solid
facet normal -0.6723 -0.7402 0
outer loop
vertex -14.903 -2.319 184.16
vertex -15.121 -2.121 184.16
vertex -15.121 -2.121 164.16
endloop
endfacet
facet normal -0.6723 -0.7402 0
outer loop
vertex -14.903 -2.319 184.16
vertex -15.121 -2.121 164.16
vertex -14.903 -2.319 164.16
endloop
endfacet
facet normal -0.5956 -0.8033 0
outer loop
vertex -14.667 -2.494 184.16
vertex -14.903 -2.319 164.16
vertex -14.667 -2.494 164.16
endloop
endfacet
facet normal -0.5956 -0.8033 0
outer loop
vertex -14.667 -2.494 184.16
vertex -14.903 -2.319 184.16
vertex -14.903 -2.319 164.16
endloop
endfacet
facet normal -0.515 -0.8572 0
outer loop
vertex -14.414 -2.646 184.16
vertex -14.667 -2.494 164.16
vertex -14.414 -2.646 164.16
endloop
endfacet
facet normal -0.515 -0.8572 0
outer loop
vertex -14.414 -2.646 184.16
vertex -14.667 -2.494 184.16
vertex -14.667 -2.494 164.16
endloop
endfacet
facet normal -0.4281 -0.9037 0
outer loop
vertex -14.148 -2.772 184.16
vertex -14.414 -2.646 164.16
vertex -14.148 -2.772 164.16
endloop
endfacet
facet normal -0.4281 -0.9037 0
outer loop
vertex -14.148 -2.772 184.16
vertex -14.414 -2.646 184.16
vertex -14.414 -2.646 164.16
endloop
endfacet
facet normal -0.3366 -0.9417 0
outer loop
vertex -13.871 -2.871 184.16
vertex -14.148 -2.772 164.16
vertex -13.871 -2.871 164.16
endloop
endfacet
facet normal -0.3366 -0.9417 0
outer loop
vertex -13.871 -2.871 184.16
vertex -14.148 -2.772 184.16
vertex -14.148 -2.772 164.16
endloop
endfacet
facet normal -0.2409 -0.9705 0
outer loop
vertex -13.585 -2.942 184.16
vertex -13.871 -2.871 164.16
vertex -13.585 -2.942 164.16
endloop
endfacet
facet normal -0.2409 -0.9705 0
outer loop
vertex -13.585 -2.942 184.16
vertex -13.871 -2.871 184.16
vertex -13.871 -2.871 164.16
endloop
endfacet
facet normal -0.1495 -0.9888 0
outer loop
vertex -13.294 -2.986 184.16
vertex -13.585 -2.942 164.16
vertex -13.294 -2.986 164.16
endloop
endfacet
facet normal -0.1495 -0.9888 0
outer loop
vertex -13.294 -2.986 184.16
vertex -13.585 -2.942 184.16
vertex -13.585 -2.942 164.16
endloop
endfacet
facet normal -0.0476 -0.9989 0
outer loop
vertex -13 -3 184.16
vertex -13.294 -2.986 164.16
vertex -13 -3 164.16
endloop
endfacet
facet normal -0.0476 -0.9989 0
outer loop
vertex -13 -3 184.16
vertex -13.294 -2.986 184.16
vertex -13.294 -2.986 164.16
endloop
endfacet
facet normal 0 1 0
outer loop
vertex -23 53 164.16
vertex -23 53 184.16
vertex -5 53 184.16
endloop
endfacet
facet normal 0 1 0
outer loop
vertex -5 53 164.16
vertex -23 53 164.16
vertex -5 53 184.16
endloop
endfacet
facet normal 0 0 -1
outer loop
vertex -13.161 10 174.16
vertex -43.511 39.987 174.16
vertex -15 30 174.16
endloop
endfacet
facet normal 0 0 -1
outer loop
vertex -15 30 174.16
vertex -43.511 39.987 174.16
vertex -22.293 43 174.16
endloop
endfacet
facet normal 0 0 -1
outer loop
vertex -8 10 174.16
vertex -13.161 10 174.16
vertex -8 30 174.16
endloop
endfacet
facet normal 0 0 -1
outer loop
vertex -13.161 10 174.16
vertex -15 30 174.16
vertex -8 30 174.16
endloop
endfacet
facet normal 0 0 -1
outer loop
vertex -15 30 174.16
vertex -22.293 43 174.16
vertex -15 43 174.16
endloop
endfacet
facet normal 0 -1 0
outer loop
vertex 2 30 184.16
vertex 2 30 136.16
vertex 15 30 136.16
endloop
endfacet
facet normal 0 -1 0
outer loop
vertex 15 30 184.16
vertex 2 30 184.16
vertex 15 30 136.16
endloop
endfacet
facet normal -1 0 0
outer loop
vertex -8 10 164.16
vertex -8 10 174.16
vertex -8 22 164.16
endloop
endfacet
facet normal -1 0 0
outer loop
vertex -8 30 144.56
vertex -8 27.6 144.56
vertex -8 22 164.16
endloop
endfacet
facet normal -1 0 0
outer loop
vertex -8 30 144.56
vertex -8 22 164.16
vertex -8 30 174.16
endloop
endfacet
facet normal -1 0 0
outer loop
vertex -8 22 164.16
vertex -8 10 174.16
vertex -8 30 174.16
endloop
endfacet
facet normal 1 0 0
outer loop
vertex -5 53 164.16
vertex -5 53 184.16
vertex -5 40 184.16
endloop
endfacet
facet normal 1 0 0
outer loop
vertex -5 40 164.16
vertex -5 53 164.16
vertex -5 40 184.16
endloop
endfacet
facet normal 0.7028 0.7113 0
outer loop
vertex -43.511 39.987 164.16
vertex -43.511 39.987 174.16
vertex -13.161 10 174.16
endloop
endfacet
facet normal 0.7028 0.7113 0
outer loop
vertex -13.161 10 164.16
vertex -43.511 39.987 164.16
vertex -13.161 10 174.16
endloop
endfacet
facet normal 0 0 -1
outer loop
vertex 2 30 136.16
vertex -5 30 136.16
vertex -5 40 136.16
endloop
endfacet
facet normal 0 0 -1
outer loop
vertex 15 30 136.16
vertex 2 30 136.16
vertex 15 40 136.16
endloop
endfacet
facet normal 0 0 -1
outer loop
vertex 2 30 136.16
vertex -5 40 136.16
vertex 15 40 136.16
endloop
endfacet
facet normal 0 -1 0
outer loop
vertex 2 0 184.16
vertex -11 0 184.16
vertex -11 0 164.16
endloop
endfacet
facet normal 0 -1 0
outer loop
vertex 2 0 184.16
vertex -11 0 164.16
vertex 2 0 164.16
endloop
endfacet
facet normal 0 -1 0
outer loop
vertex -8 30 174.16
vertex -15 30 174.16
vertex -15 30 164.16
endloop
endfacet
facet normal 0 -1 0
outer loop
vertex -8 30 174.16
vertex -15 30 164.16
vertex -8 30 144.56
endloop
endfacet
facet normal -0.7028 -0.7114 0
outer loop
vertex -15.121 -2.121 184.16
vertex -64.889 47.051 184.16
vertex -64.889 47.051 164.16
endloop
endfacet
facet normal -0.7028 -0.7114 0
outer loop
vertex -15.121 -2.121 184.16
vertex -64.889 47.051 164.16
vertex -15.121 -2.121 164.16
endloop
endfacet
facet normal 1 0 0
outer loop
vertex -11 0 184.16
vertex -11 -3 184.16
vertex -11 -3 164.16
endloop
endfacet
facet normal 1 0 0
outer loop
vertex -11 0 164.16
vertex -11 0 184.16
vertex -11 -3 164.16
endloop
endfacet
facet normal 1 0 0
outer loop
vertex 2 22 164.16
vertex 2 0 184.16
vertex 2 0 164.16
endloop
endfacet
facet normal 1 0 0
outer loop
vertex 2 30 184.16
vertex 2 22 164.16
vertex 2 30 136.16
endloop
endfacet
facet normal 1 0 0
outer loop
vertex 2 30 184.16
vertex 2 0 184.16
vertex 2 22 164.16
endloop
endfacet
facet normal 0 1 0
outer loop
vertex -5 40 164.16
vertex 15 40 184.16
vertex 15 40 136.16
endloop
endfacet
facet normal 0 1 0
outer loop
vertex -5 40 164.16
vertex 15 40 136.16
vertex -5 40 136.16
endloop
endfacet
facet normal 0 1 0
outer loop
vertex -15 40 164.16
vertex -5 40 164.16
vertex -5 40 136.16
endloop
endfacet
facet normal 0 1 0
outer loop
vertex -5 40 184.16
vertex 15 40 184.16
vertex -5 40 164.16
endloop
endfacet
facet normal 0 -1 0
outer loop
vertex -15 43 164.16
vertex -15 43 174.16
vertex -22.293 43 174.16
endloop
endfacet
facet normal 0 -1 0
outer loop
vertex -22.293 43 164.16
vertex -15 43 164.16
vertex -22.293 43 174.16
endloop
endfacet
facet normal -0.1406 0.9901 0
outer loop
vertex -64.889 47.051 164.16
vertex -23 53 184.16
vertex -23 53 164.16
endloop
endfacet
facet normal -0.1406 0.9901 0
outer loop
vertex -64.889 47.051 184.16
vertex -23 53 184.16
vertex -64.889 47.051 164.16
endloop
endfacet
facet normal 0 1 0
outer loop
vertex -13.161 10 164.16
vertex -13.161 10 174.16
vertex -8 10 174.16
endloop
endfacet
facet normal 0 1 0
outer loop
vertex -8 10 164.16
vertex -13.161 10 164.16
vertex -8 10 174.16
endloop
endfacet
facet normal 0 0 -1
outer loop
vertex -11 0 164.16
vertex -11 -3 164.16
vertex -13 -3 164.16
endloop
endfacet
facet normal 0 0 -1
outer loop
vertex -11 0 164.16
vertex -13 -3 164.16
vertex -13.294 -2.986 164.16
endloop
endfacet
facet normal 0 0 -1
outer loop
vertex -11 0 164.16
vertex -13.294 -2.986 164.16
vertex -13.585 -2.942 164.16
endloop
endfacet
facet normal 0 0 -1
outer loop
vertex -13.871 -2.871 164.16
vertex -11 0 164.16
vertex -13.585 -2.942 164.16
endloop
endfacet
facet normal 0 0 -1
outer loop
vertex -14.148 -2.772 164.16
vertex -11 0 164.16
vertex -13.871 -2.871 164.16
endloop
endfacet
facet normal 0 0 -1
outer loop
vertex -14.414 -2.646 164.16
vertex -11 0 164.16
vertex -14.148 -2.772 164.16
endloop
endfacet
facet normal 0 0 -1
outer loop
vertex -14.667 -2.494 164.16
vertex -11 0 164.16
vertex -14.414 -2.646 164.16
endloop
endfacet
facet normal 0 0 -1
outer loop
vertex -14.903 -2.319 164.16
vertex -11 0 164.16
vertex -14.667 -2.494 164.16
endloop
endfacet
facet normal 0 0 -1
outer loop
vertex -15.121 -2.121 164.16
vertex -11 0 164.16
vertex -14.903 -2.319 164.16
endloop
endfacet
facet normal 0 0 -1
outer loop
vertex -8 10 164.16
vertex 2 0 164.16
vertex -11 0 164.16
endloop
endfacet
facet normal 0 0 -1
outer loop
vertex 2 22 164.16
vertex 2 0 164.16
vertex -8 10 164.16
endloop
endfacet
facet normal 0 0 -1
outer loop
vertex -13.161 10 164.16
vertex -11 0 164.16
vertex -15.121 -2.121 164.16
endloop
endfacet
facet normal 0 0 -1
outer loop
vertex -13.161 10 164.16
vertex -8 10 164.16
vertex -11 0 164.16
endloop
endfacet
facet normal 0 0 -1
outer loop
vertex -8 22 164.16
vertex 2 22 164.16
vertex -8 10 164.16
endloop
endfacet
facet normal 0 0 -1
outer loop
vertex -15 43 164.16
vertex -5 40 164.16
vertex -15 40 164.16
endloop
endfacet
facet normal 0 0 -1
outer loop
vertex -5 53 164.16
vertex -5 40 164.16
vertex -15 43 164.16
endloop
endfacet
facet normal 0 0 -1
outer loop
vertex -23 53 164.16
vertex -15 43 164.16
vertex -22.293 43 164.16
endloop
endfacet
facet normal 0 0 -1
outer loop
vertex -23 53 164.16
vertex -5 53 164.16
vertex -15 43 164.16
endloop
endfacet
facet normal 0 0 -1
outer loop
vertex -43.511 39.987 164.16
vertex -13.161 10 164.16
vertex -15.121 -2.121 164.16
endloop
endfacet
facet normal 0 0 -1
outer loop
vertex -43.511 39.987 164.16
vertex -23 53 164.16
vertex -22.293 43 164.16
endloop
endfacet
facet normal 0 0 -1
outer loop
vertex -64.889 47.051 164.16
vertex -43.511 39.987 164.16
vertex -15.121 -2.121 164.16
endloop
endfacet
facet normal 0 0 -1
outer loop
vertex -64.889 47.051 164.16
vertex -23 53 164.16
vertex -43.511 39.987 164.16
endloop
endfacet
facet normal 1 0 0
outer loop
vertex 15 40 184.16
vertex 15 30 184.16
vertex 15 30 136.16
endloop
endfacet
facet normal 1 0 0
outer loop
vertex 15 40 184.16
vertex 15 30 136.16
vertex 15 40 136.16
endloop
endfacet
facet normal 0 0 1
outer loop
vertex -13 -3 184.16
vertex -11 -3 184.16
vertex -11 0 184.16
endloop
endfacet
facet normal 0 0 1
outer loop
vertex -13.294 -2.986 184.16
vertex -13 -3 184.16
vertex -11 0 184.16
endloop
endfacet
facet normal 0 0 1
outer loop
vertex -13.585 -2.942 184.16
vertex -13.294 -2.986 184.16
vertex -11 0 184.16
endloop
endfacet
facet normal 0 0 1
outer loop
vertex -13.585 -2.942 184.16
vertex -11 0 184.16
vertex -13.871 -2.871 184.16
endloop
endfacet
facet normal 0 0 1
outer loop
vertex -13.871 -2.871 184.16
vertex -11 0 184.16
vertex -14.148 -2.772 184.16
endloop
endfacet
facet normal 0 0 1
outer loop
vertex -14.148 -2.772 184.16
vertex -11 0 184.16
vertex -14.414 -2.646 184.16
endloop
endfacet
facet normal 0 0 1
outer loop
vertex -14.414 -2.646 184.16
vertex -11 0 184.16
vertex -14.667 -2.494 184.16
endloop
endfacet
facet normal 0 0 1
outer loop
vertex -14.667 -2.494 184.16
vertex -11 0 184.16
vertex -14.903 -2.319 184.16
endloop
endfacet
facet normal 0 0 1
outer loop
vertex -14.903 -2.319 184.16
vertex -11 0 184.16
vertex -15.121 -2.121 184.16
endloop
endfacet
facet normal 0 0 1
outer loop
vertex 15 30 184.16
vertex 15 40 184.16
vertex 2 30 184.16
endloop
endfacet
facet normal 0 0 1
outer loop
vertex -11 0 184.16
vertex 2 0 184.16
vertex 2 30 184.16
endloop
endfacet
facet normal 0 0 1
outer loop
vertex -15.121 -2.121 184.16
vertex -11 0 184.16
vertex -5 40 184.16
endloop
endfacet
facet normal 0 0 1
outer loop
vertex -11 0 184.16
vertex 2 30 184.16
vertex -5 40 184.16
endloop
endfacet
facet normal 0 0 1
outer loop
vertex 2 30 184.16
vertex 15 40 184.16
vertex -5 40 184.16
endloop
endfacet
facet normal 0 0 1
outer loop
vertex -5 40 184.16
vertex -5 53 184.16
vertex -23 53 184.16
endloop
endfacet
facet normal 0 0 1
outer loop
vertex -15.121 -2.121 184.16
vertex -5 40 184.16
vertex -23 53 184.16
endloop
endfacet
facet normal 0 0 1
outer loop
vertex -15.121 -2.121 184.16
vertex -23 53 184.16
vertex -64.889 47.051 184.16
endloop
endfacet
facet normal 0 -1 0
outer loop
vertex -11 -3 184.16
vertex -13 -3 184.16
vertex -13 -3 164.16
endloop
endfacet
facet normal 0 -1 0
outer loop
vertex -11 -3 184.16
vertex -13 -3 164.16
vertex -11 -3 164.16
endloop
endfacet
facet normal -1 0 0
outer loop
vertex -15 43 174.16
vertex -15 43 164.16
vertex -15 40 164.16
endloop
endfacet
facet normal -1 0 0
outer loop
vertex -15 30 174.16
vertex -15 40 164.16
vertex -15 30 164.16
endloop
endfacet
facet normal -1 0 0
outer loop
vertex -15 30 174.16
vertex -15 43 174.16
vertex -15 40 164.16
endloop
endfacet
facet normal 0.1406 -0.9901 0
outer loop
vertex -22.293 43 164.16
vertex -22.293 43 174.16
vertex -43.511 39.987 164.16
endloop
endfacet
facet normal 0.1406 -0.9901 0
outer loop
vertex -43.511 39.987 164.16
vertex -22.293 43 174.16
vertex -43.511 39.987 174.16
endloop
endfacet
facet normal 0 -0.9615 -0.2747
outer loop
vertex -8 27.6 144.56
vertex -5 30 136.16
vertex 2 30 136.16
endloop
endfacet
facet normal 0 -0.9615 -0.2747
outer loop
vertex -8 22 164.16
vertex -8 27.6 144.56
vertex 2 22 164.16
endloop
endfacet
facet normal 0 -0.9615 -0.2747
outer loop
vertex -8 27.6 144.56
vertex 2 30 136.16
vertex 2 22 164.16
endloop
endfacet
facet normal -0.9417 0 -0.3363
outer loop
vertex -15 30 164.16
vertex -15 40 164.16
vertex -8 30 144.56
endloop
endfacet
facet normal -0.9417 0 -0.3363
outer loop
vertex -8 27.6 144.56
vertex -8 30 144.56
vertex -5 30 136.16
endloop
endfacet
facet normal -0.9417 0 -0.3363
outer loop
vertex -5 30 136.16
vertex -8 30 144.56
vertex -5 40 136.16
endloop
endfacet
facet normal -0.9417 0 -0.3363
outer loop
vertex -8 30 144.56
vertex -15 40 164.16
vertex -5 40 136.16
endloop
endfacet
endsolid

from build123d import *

# Parameters (mm, degrees)
EXTRUDE_1_DEPTH       = 172
SHELL_START           = 6
SHELL_1_DEPTH         = 160
SKETCH_2_W            = 36
SKETCH_2_H            = 16
CUT_EXTRUDE_1_DEPTH   = 74
EXTRUDE_2_DEPTH       = 2
SKETCH_4_R            = 10
CUT_EXTRUDE_2_DEPTH   = 186
SKETCH_5_R            = 1.5
CUT_EXTRUDE_3_DEPTH   = 10
EXTRUDE_3_DEPTH       = 172
SKETCH_7_W            = 36
SKETCH_7_H            = 16
CUT_EXTRUDE_4_DEPTH   = 172
SKETCH_8_W            = 6
SKETCH_8_H            = 172
CUT_EXTRUDE_5_DEPTH   = 3
EXTRUDE_4_DEPTH       = 15
CHAMFER_1_SIZE        = 15
CHAMFER_2_SIZE        = 15
CHAMFER_3_SIZE        = 8
SKETCH_10_R           = 1.35
CUT_EXTRUDE_6_DEPTH   = 15
SKETCH_12_R           = 1.35
CUT_EXTRUDE_7_DEPTH   = 15
SKETCH_14_OUTSIDE_W   = 213.548
SKETCH_14_OUTSIDE_H   = 97.548
SKETCH_14_OUTSIDE_W_2 = 15
SKETCH_14_OUTSIDE_H_2 = 56
CUT_EXTRUDE_8_DEPTH   = 82.5
EXTRUDE_5_DEPTH       = 15
CUT_EXTRUDE_9_DEPTH   = 15
SKETCH_17_W           = 13
SKETCH_17_H           = 5
EXTRUDE_6_DEPTH       = 15
EXTRUDE_7_DEPTH       = 20
SHELL_START_2         = 78.159554327
SHELL_2_DEPTH         = 10
EXTRUDE_8_DEPTH       = 28
CUT_EXTRUDE_10_DEPTH  = 20
CUT_EXTRUDE_11_DEPTH  = 20
CUT_EXTRUDE_12_DEPTH  = 63


# Read off the part's stored shape, not the designer's step: 抽壳1, 抽壳2
with BuildPart() as part:
    # 草图1 → 凸台-拉伸1 (new body)
    with BuildSketch(Plane.XY):
        with BuildLine():
            Line((0, 0), (0, 40))
            Line((0, 40), (-5, 40))
            Line((-5, 40), (-5, 53))
            Line((-5, 53), (-23, 53))
            Line((-23, 53), (-64.888578151, 47.050698608))
            Line((-64.888578151, 47.050698608), (-15.121320344, -2.121320344))
            ThreePointArc((-15.121320344, -2.121320344), (-14.148050297, -2.771638598), (-13, -3))
            Line((-13, -3), (-5, -3))
            Line((-5, -3), (-5, 0))
            Line((-5, 0), (0, 0))
        make_face()
    extrude(amount=EXTRUDE_1_DEPTH)

    # 抽壳1 outline → 抽壳1 (cut)
    with BuildSketch(Plane.XY.offset(SHELL_START)):
        Polygon((-11, 6), (-6, 6), (-6, 34), (-11, 34), (-11, 47), (-22.576046832, 47), (-52.061983815, 42.812206246), (-11.767841448, 3), (-11, 3), align=None)
    extrude(amount=SHELL_1_DEPTH, mode=Mode.SUBTRACT)

    # 草图2 → 切除-拉伸1 (cut)
    with BuildSketch(Plane(origin=(0, 0, 0), x_dir=(0, 0, -1), z_dir=(1, 0, 0))):
        with Locations((-136, 10)):
            Rectangle(SKETCH_2_W, SKETCH_2_H)
        with Locations((-36, 10)):
            Rectangle(SKETCH_2_W, SKETCH_2_H)
    extrude(amount=-CUT_EXTRUDE_1_DEPTH, mode=Mode.SUBTRACT)

    # 草图3 → 凸台-拉伸2 (add, symmetric)
    with BuildSketch(Plane(origin=(0, 0, 86), x_dir=(-1, 0, 0), z_dir=(0, 0, -1))):
        Polygon((5, 53), (5, 40), (0, 40), (0, 0), (5, 0), (5, -3), (13, -3), (16.579355858, -0.680723591), (64.888578151, 47.050698608), (23, 53), align=None)
    extrude(amount=EXTRUDE_2_DEPTH, both=True)

    # 草图4 → 切除-拉伸2 (cut)
    with BuildSketch(Plane.XY.offset(172)):
        with Locations((-15, 21.071297481)):
            Circle(SKETCH_4_R)
    extrude(amount=-CUT_EXTRUDE_2_DEPTH, mode=Mode.SUBTRACT)

    # 草图5 → 切除-拉伸3 (cut)
    with BuildSketch(Plane(origin=(0, 53, 0), x_dir=(1, 0, 0), z_dir=(0, 1, 0))):
        with Locations(Location((-13.338195438, -63.5, 0), (0, 0, 270))):
            Circle(SKETCH_5_R)
        with Locations(Location((-13.338195438, -108.5, 0), (0, 0, 270))):
            Circle(SKETCH_5_R)
    extrude(amount=-CUT_EXTRUDE_3_DEPTH, mode=Mode.SUBTRACT)

    # 草图6 → 凸台-拉伸3 (add)
    with BuildSketch(Plane.XY.offset(172)):
        Polygon((-11, 6), (-14.804157153, 6), (-11.767841448, 3), (-11, 3), align=None)
    extrude(amount=-EXTRUDE_3_DEPTH)

    # 草图7 → 切除-拉伸4 (cut)
    with BuildSketch(Plane(origin=(0, 0, 0), x_dir=(0, 0, -1), z_dir=(1, 0, 0))):
        with Locations((-136, 10)):
            Rectangle(SKETCH_7_W, SKETCH_7_H)
        with Locations((-36, 10)):
            Rectangle(SKETCH_7_W, SKETCH_7_H)
    extrude(amount=-CUT_EXTRUDE_4_DEPTH, mode=Mode.SUBTRACT)

    # 草图8 → 切除-拉伸5 (cut)
    with BuildSketch(Plane.XZ.offset(3)):
        with Locations((-8, 86)):
            Rectangle(SKETCH_8_W, SKETCH_8_H)
    extrude(amount=-CUT_EXTRUDE_5_DEPTH, mode=Mode.SUBTRACT)

    # 草图9 → 凸台-拉伸4 (add)
    with BuildSketch(Plane(origin=(0, 0, 0), x_dir=(0, 0, -1), z_dir=(1, 0, 0))):
        Polygon((-86, 40), (-151, 40), (-151, 35), (-86, 35), (-21, 35), (-21, 40), align=None)
    extrude(amount=EXTRUDE_4_DEPTH)

    # 倒角1
    chamfer_1_edges = [part.edges().sort_by_distance(p)[0] for p in [
        (15, 37.5, 151),
    ]]
    chamfer(chamfer_1_edges, length=CHAMFER_1_SIZE - 0.0001)  # a hair under: the kernel refuses the full size

    # 倒角2
    chamfer_2_edges = [part.edges().sort_by_distance(p)[0] for p in [
        (15, 37.5, 21),
    ]]
    chamfer(chamfer_2_edges, length=CHAMFER_2_SIZE - 0.0001)  # a hair under: the kernel refuses the full size

    # 倒角3
    chamfer_3_edges = [part.edges().sort_by_distance(p)[0] for p in [
        (0, 35, 86),
    ]]
    chamfer(chamfer_3_edges, length=CHAMFER_3_SIZE)

    # 草图10 → 切除-拉伸6 (cut)
    with BuildSketch(Plane.XZ):
        with Locations((-5, 158)):
            Circle(SKETCH_10_R)
        with Locations((-5, 111)):
            Circle(SKETCH_10_R)
        with Locations((-5, 61)):
            Circle(SKETCH_10_R)
        with Locations((-5, 14.01360213)):
            Circle(SKETCH_10_R)
    extrude(amount=-CUT_EXTRUDE_6_DEPTH, mode=Mode.SUBTRACT)

    # 草图12 → 切除-拉伸7 (cut)
    with BuildSketch(Plane(origin=(0, 40, 0), x_dir=(1, 0, 0), z_dir=(0, 1, 0))):
        with Locations(Location((5, -41, 0), (0, 0, 270))):
            Circle(SKETCH_12_R)
        with Locations(Location((5, -86, 0), (0, 0, 270))):
            Circle(SKETCH_12_R)
        with Locations(Location((5, -131, 0), (0, 0, 270))):
            Circle(SKETCH_12_R)
    extrude(amount=-CUT_EXTRUDE_7_DEPTH, mode=Mode.SUBTRACT)

    # 草图14 outside → 切除-拉伸8 (cut, symmetric)
    with BuildSketch(Plane(origin=(0, 0, 0), x_dir=(0, 0, -1), z_dir=(1, 0, 0))):
        with Locations((-86, 25)):
            Rectangle(SKETCH_14_OUTSIDE_W, SKETCH_14_OUTSIDE_H)
        with Locations((-75.659554327, 25)):
            Rectangle(SKETCH_14_OUTSIDE_W_2, SKETCH_14_OUTSIDE_H_2, mode=Mode.SUBTRACT)
    extrude(amount=CUT_EXTRUDE_8_DEPTH, both=True, mode=Mode.SUBTRACT)

    # 草图15 → 凸台-拉伸5 (add)
    with BuildSketch(Plane(origin=(0, 0, 68.159554327), x_dir=(-1, 0, 0), z_dir=(0, 0, -1))):
        Polygon((0, 0), (-2, 0), (-2, 29), (0, 27), align=None)
    extrude(amount=-EXTRUDE_5_DEPTH)

    # 草图16 → 切除-拉伸9 (cut)
    with BuildSketch(Plane(origin=(0, 0, 68.159554327), x_dir=(-1, 0, 0), z_dir=(0, 0, -1))):
        Polygon((-2, 29), (-2, 35), (-8, 35), align=None)
    extrude(amount=-CUT_EXTRUDE_9_DEPTH, mode=Mode.SUBTRACT)

    # 草图17 → 凸台-拉伸6 (add)
    with BuildSketch(Plane(origin=(0, 0, 68.159554327), x_dir=(-1, 0, 0), z_dir=(0, 0, -1))):
        with Locations((-8.5, 32.5)):
            Rectangle(SKETCH_17_W, SKETCH_17_H)
    extrude(amount=-EXTRUDE_6_DEPTH)

    # 草图18 → 凸台-拉伸7 (add)
    with BuildSketch(Plane(origin=(0, 0, 68.159554327), x_dir=(-1, 0, 0), z_dir=(0, 0, -1))):
        with BuildLine():
            Line((-15, 40), (-15, 30))
            Line((-15, 30), (-2, 30))
            Line((-2, 30), (-2, 0))
            Line((-2, 0), (11, 0))
            Line((11, 0), (11, -3))
            Line((11, -3), (13, -3))
            ThreePointArc((13, -3), (14.148050297, -2.771638598), (15.121320344, -2.121320344))
            Line((15.121320344, -2.121320344), (64.888578151, 47.050698608))
            Line((64.888578151, 47.050698608), (23, 53))
            Line((23, 53), (5, 53))
            Line((5, 53), (5, 40))
            Line((5, 40), (-15, 40))
        make_face()
    extrude(amount=-EXTRUDE_7_DEPTH)

    # 抽壳2 outline → 抽壳2 (cut)
    with BuildSketch(Plane.XY.offset(SHELL_START_2)):
        Polygon((-8, 30), (-15, 30), (-15, 43), (-22.293411387, 43), (-43.510920925, 39.986544671), (-13.161382076, 10), (-8, 10), align=None)
    extrude(amount=SHELL_2_DEPTH, mode=Mode.SUBTRACT)

    # 草图20 → 凸台-拉伸8 (add)
    with BuildSketch(Plane.XY.offset(88.159554327)):
        Polygon((15, 40), (-15, 40), (-15, 30), (-8, 30), (-8, 22), (2, 22), (2, 30), (15, 30), align=None)
    extrude(amount=EXTRUDE_8_DEPTH)

    # 草图21 → 切除-拉伸10 (cut)
    with BuildSketch(Plane(origin=(2, 0, 0), x_dir=(0, 0, -1), z_dir=(1, 0, 0))):
        Polygon((-116.159554327, 30), (-88.159554327, 22), (-116.159554327, 22), align=None)
    extrude(amount=-CUT_EXTRUDE_10_DEPTH, mode=Mode.SUBTRACT)

    # 草图22 → 切除-拉伸11 (cut)
    with BuildSketch(Plane(origin=(0, 40, 0), x_dir=(1, 0, 0), z_dir=(0, 1, 0))):
        Polygon((-8, -116.159554327), (-15, -116.159554327), (-15, -88.159554327), (-5, -116.159554327), align=None)
    extrude(amount=-CUT_EXTRUDE_11_DEPTH, mode=Mode.SUBTRACT)


with BuildPart() as body_2:
    # 镜向6: mirrored copy
    add(part.part.mirror(Plane.XY.offset(126.159554327)))


with BuildPart() as part_1:
    add(part.part)

    # 草图24 → 切除-拉伸12 (cut, symmetric)
    with BuildSketch(Plane(origin=(0, 40, 0), x_dir=(1, 0, 0), z_dir=(0, 1, 0))):
        Polygon((-102.39415219, -125.726561749), (32.776263332, -125.726561749), (42.64807393, -30.561512846), (-60.072475676, -35.644094183), align=None)
    extrude(amount=CUT_EXTRUDE_12_DEPTH, both=True, mode=Mode.SUBTRACT)


solid = body_2.part
